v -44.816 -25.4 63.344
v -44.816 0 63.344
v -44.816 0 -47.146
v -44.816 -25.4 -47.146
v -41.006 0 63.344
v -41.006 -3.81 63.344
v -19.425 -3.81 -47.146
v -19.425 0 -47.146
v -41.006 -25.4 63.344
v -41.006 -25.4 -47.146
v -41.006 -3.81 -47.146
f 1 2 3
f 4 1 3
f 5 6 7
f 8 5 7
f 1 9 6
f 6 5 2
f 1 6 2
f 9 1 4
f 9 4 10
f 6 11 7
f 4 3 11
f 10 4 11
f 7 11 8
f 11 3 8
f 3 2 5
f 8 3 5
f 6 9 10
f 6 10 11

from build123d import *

# Parameters (mm, degrees)
F1_DEPTH = 25.4
F2_W     = 21.580409
F2_H     = 21.59
F3_DEPTH = 127
F5_DEPTH = 25.4


with BuildPart() as f1:
    # F0 (on Front) → F1 (new body)
    with BuildSketch(Plane.XZ):
        Polygon((-19.42512, -47.146455), (-44.815529, 63.343545), (-44.815529, -47.146455), align=None)
        Polygon((-19.42512, 63.343545), (-44.815529, 63.343545), (-19.42512, -47.146455), align=None)
    extrude(amount=F1_DEPTH)

    # F2 (on face) → F3 (cut)
    with BuildSketch(Plane.XY.offset(63.343545)):
        with Locations((-30.215324, -14.605)):
            Rectangle(F2_W, F2_H)
    extrude(amount=-F3_DEPTH, mode=Mode.SUBTRACT)

    # F4 (on face) → F5 (cut)
    with BuildSketch(Plane.XZ.offset(3.81)):
        Polygon((-19.42512, 63.343545), (-41.005529, 63.343545), (-19.42512, -47.146455), align=None)
    extrude(amount=-F5_DEPTH, mode=Mode.SUBTRACT)


solid = f1.part
